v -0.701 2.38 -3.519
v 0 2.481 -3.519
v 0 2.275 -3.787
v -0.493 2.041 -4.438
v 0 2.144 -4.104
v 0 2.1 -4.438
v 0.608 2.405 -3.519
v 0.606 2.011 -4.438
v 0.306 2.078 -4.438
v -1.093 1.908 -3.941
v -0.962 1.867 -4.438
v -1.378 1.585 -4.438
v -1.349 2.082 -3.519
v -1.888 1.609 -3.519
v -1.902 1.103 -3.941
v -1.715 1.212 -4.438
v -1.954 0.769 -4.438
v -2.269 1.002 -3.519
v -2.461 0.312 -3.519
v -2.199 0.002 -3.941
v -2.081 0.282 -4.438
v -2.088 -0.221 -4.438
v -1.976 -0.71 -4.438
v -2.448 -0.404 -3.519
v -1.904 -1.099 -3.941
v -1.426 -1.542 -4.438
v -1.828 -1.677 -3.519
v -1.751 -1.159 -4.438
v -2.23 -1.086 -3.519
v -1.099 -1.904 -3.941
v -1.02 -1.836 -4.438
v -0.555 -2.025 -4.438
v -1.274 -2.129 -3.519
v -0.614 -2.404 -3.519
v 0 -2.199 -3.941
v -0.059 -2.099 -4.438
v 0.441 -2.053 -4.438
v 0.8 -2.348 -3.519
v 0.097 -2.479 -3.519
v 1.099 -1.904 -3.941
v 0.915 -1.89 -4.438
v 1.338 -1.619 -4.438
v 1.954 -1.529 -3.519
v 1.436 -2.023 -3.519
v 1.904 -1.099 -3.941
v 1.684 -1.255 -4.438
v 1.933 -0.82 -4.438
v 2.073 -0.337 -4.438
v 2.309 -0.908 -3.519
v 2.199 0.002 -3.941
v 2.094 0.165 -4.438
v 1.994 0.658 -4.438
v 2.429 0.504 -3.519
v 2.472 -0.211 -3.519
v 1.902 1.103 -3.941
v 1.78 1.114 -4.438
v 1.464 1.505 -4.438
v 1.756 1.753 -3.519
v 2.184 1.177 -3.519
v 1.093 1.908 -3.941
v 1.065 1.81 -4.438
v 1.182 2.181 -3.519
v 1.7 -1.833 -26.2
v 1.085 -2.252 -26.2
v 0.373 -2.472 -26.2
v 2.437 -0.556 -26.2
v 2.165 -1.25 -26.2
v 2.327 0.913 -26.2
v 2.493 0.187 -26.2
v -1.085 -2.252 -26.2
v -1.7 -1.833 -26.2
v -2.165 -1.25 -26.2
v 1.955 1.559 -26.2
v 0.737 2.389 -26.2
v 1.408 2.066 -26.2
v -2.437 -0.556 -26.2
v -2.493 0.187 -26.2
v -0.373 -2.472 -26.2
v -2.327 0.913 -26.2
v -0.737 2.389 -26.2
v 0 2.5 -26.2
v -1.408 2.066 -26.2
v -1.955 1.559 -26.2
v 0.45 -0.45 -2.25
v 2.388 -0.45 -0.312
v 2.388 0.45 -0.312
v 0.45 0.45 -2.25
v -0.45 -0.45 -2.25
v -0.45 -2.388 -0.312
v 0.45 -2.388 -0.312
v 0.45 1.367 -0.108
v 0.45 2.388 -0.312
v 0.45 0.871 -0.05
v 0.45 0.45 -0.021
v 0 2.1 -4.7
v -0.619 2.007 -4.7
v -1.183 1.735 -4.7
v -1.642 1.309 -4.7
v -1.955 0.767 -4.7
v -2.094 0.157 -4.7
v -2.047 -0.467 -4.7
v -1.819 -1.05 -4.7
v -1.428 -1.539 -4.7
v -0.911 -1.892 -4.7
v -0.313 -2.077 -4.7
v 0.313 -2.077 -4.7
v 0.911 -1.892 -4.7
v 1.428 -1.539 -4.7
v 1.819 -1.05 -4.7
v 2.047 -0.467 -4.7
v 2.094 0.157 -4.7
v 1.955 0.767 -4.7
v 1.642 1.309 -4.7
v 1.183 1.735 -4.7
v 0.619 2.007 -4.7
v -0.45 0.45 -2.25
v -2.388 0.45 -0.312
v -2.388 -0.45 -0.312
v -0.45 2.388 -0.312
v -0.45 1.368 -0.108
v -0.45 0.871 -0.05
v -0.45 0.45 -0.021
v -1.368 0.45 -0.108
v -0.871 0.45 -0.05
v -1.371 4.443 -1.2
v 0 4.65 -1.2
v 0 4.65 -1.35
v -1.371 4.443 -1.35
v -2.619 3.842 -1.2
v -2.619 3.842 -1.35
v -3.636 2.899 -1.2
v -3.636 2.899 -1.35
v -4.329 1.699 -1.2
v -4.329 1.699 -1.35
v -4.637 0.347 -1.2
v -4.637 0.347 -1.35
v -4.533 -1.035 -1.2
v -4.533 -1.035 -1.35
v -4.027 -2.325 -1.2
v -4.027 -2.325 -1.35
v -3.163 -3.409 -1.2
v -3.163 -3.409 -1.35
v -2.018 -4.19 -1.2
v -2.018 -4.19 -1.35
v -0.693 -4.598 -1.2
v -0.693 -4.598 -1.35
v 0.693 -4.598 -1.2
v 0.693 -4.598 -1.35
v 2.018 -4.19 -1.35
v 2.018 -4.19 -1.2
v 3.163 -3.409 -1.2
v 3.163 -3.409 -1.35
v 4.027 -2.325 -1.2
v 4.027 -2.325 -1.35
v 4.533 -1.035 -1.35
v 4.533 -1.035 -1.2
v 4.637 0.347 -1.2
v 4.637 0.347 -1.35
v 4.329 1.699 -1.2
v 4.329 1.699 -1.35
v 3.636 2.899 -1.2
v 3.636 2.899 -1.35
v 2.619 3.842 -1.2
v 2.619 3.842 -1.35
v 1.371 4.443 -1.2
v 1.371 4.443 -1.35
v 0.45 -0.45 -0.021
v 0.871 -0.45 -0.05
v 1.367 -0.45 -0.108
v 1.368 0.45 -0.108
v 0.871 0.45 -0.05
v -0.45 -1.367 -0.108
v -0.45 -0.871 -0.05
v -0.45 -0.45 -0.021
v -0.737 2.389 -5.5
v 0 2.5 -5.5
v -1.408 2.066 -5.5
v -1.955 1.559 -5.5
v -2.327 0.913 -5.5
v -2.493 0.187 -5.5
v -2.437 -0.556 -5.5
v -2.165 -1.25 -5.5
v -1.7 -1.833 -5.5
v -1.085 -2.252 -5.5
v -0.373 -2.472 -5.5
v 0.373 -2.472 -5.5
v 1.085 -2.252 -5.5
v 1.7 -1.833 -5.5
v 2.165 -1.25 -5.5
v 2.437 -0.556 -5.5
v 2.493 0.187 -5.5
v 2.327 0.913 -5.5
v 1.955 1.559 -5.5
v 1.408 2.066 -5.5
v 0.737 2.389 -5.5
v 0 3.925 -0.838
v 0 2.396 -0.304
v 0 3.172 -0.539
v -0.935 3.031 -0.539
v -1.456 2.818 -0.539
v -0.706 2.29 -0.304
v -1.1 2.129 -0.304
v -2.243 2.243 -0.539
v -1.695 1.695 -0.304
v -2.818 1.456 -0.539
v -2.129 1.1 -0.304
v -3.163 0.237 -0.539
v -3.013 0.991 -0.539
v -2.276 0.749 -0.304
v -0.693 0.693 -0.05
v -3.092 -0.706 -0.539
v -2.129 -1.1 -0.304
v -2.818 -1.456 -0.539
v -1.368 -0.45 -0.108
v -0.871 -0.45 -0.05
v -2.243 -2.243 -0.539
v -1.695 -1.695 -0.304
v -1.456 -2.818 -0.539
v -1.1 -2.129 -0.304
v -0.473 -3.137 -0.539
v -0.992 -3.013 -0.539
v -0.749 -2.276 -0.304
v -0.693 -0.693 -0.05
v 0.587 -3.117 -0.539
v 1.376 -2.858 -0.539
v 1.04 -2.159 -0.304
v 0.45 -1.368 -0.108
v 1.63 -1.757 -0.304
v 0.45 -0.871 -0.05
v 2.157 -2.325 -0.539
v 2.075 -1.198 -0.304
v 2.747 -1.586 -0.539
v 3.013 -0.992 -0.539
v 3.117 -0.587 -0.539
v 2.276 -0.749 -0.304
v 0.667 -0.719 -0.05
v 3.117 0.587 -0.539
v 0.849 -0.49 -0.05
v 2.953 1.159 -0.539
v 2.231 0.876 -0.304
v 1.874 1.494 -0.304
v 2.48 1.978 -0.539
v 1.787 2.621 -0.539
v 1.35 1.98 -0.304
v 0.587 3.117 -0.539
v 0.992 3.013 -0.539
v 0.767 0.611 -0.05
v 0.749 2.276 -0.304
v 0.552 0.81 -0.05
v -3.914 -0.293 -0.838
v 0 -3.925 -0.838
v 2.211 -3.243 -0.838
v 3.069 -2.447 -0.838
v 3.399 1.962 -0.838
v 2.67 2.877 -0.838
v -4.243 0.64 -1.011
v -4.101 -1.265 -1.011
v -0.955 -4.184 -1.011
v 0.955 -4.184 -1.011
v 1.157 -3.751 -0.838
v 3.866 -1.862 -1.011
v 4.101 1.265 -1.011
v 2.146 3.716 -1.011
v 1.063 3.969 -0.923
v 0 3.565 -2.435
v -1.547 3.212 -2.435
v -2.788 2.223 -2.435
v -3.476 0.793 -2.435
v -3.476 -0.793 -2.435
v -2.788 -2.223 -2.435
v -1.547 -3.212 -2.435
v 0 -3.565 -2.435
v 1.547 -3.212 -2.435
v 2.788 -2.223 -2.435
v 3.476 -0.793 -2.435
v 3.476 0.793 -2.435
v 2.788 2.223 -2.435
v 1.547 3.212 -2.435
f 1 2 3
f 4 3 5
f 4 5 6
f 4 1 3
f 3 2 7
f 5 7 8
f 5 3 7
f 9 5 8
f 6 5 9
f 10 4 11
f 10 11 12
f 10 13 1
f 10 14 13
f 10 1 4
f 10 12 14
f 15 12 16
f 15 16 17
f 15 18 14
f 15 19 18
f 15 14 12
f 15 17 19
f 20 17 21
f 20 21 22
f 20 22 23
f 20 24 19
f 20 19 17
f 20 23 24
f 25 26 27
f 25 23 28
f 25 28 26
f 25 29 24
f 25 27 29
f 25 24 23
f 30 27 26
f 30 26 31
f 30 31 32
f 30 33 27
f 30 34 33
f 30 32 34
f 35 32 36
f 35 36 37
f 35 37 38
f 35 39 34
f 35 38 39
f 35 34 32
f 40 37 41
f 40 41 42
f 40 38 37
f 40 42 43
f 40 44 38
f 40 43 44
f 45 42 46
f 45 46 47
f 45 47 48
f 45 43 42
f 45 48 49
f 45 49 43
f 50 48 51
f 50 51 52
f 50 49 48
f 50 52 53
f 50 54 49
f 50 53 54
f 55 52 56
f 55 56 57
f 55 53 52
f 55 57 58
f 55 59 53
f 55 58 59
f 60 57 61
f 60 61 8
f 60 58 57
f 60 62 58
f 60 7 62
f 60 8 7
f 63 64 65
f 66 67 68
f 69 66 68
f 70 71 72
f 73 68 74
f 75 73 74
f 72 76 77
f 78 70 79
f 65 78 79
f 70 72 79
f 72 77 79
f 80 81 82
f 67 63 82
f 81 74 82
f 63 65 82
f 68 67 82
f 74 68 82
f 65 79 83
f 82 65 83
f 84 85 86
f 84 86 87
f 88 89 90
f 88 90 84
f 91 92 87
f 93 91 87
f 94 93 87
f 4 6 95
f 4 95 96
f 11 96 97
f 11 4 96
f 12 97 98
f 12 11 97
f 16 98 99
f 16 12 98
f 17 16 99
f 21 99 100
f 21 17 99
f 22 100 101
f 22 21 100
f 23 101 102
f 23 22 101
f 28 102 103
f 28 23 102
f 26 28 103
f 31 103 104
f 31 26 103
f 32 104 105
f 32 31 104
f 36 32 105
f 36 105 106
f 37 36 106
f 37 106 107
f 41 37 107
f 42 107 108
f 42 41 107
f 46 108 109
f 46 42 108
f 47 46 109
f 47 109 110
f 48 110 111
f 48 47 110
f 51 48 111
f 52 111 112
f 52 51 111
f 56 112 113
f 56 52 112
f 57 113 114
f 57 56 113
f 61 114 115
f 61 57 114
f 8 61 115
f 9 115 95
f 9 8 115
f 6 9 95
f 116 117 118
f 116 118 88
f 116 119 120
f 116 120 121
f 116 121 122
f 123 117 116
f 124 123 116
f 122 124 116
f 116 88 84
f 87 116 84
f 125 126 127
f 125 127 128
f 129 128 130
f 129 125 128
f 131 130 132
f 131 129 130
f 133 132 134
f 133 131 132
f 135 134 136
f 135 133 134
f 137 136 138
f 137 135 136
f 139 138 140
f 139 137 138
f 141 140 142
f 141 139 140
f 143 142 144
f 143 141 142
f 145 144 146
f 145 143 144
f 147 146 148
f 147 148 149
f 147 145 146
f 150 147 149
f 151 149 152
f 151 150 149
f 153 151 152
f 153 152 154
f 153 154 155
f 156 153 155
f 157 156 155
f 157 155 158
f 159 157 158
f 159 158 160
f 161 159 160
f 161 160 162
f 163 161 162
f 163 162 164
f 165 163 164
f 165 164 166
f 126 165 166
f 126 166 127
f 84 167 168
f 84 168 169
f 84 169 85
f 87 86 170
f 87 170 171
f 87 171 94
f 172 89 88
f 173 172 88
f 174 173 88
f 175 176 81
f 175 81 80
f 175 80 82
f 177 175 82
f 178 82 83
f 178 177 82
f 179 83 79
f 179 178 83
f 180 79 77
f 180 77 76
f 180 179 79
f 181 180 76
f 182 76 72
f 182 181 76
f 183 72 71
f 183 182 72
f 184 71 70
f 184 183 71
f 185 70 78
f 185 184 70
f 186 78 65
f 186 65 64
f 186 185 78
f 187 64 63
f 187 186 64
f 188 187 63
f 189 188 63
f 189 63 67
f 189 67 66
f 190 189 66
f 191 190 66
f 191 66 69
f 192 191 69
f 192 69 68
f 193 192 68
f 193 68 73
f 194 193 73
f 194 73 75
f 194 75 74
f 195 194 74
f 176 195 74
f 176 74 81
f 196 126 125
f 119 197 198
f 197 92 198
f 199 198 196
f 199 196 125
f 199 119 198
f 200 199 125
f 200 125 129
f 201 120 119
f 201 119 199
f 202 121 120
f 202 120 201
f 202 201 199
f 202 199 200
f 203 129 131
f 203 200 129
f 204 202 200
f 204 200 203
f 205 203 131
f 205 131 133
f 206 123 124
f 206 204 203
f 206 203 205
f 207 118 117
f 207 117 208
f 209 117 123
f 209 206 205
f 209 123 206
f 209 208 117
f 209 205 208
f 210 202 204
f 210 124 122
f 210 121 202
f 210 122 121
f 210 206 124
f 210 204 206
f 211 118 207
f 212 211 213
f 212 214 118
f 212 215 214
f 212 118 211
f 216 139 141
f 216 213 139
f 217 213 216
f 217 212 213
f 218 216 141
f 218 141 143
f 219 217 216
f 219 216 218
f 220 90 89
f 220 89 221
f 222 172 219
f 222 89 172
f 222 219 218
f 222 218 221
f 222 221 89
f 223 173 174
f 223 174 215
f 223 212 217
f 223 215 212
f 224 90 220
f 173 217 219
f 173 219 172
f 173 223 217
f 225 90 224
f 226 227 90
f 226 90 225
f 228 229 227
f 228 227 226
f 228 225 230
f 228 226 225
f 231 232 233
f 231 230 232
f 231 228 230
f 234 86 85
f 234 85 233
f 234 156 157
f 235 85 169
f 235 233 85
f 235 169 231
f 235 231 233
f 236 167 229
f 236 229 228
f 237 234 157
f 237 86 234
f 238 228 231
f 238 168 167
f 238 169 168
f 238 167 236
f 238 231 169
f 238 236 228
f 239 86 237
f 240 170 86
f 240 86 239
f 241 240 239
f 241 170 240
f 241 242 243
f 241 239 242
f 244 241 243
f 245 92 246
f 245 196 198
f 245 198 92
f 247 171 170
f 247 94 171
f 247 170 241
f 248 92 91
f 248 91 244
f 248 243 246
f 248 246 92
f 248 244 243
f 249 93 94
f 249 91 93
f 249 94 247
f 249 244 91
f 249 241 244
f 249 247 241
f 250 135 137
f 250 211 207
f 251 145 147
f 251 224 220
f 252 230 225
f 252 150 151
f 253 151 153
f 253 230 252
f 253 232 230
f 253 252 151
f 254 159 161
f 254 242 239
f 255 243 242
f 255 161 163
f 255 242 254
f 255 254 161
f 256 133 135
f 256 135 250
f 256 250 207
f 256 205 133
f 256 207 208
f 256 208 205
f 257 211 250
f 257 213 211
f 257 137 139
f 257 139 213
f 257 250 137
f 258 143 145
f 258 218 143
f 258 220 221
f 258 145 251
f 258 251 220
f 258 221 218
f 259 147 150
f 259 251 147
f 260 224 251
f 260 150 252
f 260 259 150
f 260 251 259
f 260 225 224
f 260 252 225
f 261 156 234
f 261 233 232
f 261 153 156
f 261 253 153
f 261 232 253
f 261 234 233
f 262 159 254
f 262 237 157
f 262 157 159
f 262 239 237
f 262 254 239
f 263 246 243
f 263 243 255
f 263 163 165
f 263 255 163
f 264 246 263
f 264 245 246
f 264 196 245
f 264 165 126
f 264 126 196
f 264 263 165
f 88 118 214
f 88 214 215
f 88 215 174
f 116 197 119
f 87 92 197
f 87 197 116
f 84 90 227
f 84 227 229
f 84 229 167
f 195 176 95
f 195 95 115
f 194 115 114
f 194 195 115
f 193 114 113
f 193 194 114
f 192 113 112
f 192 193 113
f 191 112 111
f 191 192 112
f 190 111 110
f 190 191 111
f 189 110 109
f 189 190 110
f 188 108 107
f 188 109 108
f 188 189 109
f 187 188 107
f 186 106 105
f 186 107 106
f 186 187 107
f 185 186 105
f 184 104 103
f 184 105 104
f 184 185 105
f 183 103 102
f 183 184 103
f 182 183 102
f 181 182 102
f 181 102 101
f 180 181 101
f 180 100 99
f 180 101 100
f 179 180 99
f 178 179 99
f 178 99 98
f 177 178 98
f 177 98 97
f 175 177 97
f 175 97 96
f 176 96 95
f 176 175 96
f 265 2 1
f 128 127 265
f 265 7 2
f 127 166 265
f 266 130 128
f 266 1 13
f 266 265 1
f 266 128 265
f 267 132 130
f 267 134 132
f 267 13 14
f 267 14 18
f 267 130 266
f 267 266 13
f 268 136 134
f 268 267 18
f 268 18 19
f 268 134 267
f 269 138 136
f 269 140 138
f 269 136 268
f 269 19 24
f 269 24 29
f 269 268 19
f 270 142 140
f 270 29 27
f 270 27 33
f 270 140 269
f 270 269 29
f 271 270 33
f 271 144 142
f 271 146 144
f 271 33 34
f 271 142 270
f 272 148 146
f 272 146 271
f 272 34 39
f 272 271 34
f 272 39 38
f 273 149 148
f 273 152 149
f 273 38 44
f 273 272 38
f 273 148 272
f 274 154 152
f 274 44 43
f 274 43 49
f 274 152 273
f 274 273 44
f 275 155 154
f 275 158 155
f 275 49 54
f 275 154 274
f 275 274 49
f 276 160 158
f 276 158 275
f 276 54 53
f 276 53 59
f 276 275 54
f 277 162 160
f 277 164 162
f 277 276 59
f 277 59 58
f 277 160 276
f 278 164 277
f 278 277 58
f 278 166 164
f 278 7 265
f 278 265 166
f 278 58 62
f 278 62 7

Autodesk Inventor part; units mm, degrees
ref_plane "WorkPlane2" through (0, 0, 0) normal (0, 0, 1) x (1, 0, 0)
sketch "Sketch1" plane through (0, 0, 0) normal (1, 0, 0) x (0, 1, 0)
  point P0 (0, 0)
ref_plane "Work Plane2" through (0, 0, -3.9) normal (0, 0, 1) x (1, 0, 0)
ref_plane "WorkPlane3" through (0, 0, 7) normal (0, 0, 1) x (1, 0, 0)
sketch "Sketch2" plane through (0, 0, 0) normal (0, 1, 0) x (-1, 0, 0)
  point P0 (0, 0)
sketch "Sketch3" plane through (0, 0, 0) normal (1, 0, 0) x (0, 1, 0)
  line L0 (2.5, -5.5) -> (2.1, -4.7)
  line L1 (2.5, -26.2) -> (2.5, -5.5)
  line L2 (0, -26.2) -> (2.5, -26.2)
  line L3 (0, 0) -> (0, -26.2)
  arc A0 (4.65, -1.2) -> (0, 0) centre (0, -9.6094) ccw
  line L4 (4.65, -1.35) -> (4.65, -1.2)
  line L5 (2.1, -3.9) -> (4.65, -1.35)
  line L6 (2.1, -4.7) -> (2.1, -3.9)
  line L7 (0, -31.6445) -> (0, 31.6445) construction
  line L8 (0, -31.6445) -> (0, 31.6445)
  line L9 (0, -44.3023) -> (0, 44.3023) projected
  dimension "d2" = 2.5
  dimension "d4" = 2.1
  dimension "d6" = 0.8
  dimension "d8" = 2.7
  dimension "d10" = 135
  dimension "d12" = 4.65
  dimension "d14" = 0
  dimension "d16" = 1.2
  dimension "d18" = 25
  dimension "d22" = 20.7
revolve "Revolution1" add sketch "Sketch3" angle 360 about axis through (0, 0, -31.6445) along (0, 0, 1)
fillet "Fillet1" radius 1.3 1 edges at (0, -2.1, -3.9)
sketch "Sketch4" plane through (0, 0, 0) normal (0, 1, 0) x (-1, 0, 0)
  line L0 (0, 0) -> (-2.7, 0)
  line L1 (0, -2.25) -> (0, 0)
  line L2 (-2.7, 0) -> (-0.45, -2.25)
  line L3 (0, -11.5313) -> (0, 1.9219) projected
  arc A0 (4.65, -1.2) -> (-4.65, -1.2) centre (0, -9.6094) ccw projected
  line L4 (0, -2.25) -> (-0.45, -2.25)
  point P0 (0, -2.7)
  dimension "d30" = 45
  dimension "d33" = 5.4
  dimension "d34" = 0.45
  dimension "d35" = 90
extrude "Extrusion1" cut sketch "Sketch4" along normal mid plane 0.9
pattern_circular "PolarArray1" count 4 over 360 about axis through (0, 0, -10) along (0, 0, 1) of "Extrusion1"
thread "Thread1" size "M5x0.8" class "6g" standard "ISO Metric profile" full length
ref_plane "MSC_PF1" through (0, 0, 0) normal (1, 0, 0) x (0, 1, 0)
ref_plane "MSC_PT1" through (0, 4.65, -1.35) normal (0, 0, -1) x (-1, 0, 0)
equation "\"d2\" = 0.5 * NND"
equation "\"d4\" = 0.5 * msp_mdtds"
equation "\"d6\" = msp_x"
equation "\"d8\" = ParK"
equation "\"d12\" = 0.5 * Dk"
equation "\"d16\" = ParF"
equation "\"d18\" = NLG"
equation "\"d22\" = b"
equation "\"d24\" = r"
equation "\"d33\" = M"
equation "\"d34\" = 0.0833333 * M"
equation "\"d31\" = 0.166667 * M"
equation "\"d39\" = b"
equation "\"PTC\" = 0.8"
equation "\"msp_x\" = PTC"
equation "\"NLG\" = 25"
equation "\"NND\" = 5"
equation "\"ParK\" = 2.7"
equation "\"r\" = 1.3"
equation "\"msp_mdtds\" = NND - PTC"
equation "\"b\" = 20.7"
equation "\"Dk\" = 9.3"
equation "\"ParF\" = 1.2"
equation "\"M\" = 5.4"
equation "\"ParA\" = 1.6"
equation "\"THREADDIA\" = NND"
equation "\"TEMPLATE\" = 1.2345"
properties part number "ISO 7047 - M5x25 - 4.8 - H" material "Steel"
